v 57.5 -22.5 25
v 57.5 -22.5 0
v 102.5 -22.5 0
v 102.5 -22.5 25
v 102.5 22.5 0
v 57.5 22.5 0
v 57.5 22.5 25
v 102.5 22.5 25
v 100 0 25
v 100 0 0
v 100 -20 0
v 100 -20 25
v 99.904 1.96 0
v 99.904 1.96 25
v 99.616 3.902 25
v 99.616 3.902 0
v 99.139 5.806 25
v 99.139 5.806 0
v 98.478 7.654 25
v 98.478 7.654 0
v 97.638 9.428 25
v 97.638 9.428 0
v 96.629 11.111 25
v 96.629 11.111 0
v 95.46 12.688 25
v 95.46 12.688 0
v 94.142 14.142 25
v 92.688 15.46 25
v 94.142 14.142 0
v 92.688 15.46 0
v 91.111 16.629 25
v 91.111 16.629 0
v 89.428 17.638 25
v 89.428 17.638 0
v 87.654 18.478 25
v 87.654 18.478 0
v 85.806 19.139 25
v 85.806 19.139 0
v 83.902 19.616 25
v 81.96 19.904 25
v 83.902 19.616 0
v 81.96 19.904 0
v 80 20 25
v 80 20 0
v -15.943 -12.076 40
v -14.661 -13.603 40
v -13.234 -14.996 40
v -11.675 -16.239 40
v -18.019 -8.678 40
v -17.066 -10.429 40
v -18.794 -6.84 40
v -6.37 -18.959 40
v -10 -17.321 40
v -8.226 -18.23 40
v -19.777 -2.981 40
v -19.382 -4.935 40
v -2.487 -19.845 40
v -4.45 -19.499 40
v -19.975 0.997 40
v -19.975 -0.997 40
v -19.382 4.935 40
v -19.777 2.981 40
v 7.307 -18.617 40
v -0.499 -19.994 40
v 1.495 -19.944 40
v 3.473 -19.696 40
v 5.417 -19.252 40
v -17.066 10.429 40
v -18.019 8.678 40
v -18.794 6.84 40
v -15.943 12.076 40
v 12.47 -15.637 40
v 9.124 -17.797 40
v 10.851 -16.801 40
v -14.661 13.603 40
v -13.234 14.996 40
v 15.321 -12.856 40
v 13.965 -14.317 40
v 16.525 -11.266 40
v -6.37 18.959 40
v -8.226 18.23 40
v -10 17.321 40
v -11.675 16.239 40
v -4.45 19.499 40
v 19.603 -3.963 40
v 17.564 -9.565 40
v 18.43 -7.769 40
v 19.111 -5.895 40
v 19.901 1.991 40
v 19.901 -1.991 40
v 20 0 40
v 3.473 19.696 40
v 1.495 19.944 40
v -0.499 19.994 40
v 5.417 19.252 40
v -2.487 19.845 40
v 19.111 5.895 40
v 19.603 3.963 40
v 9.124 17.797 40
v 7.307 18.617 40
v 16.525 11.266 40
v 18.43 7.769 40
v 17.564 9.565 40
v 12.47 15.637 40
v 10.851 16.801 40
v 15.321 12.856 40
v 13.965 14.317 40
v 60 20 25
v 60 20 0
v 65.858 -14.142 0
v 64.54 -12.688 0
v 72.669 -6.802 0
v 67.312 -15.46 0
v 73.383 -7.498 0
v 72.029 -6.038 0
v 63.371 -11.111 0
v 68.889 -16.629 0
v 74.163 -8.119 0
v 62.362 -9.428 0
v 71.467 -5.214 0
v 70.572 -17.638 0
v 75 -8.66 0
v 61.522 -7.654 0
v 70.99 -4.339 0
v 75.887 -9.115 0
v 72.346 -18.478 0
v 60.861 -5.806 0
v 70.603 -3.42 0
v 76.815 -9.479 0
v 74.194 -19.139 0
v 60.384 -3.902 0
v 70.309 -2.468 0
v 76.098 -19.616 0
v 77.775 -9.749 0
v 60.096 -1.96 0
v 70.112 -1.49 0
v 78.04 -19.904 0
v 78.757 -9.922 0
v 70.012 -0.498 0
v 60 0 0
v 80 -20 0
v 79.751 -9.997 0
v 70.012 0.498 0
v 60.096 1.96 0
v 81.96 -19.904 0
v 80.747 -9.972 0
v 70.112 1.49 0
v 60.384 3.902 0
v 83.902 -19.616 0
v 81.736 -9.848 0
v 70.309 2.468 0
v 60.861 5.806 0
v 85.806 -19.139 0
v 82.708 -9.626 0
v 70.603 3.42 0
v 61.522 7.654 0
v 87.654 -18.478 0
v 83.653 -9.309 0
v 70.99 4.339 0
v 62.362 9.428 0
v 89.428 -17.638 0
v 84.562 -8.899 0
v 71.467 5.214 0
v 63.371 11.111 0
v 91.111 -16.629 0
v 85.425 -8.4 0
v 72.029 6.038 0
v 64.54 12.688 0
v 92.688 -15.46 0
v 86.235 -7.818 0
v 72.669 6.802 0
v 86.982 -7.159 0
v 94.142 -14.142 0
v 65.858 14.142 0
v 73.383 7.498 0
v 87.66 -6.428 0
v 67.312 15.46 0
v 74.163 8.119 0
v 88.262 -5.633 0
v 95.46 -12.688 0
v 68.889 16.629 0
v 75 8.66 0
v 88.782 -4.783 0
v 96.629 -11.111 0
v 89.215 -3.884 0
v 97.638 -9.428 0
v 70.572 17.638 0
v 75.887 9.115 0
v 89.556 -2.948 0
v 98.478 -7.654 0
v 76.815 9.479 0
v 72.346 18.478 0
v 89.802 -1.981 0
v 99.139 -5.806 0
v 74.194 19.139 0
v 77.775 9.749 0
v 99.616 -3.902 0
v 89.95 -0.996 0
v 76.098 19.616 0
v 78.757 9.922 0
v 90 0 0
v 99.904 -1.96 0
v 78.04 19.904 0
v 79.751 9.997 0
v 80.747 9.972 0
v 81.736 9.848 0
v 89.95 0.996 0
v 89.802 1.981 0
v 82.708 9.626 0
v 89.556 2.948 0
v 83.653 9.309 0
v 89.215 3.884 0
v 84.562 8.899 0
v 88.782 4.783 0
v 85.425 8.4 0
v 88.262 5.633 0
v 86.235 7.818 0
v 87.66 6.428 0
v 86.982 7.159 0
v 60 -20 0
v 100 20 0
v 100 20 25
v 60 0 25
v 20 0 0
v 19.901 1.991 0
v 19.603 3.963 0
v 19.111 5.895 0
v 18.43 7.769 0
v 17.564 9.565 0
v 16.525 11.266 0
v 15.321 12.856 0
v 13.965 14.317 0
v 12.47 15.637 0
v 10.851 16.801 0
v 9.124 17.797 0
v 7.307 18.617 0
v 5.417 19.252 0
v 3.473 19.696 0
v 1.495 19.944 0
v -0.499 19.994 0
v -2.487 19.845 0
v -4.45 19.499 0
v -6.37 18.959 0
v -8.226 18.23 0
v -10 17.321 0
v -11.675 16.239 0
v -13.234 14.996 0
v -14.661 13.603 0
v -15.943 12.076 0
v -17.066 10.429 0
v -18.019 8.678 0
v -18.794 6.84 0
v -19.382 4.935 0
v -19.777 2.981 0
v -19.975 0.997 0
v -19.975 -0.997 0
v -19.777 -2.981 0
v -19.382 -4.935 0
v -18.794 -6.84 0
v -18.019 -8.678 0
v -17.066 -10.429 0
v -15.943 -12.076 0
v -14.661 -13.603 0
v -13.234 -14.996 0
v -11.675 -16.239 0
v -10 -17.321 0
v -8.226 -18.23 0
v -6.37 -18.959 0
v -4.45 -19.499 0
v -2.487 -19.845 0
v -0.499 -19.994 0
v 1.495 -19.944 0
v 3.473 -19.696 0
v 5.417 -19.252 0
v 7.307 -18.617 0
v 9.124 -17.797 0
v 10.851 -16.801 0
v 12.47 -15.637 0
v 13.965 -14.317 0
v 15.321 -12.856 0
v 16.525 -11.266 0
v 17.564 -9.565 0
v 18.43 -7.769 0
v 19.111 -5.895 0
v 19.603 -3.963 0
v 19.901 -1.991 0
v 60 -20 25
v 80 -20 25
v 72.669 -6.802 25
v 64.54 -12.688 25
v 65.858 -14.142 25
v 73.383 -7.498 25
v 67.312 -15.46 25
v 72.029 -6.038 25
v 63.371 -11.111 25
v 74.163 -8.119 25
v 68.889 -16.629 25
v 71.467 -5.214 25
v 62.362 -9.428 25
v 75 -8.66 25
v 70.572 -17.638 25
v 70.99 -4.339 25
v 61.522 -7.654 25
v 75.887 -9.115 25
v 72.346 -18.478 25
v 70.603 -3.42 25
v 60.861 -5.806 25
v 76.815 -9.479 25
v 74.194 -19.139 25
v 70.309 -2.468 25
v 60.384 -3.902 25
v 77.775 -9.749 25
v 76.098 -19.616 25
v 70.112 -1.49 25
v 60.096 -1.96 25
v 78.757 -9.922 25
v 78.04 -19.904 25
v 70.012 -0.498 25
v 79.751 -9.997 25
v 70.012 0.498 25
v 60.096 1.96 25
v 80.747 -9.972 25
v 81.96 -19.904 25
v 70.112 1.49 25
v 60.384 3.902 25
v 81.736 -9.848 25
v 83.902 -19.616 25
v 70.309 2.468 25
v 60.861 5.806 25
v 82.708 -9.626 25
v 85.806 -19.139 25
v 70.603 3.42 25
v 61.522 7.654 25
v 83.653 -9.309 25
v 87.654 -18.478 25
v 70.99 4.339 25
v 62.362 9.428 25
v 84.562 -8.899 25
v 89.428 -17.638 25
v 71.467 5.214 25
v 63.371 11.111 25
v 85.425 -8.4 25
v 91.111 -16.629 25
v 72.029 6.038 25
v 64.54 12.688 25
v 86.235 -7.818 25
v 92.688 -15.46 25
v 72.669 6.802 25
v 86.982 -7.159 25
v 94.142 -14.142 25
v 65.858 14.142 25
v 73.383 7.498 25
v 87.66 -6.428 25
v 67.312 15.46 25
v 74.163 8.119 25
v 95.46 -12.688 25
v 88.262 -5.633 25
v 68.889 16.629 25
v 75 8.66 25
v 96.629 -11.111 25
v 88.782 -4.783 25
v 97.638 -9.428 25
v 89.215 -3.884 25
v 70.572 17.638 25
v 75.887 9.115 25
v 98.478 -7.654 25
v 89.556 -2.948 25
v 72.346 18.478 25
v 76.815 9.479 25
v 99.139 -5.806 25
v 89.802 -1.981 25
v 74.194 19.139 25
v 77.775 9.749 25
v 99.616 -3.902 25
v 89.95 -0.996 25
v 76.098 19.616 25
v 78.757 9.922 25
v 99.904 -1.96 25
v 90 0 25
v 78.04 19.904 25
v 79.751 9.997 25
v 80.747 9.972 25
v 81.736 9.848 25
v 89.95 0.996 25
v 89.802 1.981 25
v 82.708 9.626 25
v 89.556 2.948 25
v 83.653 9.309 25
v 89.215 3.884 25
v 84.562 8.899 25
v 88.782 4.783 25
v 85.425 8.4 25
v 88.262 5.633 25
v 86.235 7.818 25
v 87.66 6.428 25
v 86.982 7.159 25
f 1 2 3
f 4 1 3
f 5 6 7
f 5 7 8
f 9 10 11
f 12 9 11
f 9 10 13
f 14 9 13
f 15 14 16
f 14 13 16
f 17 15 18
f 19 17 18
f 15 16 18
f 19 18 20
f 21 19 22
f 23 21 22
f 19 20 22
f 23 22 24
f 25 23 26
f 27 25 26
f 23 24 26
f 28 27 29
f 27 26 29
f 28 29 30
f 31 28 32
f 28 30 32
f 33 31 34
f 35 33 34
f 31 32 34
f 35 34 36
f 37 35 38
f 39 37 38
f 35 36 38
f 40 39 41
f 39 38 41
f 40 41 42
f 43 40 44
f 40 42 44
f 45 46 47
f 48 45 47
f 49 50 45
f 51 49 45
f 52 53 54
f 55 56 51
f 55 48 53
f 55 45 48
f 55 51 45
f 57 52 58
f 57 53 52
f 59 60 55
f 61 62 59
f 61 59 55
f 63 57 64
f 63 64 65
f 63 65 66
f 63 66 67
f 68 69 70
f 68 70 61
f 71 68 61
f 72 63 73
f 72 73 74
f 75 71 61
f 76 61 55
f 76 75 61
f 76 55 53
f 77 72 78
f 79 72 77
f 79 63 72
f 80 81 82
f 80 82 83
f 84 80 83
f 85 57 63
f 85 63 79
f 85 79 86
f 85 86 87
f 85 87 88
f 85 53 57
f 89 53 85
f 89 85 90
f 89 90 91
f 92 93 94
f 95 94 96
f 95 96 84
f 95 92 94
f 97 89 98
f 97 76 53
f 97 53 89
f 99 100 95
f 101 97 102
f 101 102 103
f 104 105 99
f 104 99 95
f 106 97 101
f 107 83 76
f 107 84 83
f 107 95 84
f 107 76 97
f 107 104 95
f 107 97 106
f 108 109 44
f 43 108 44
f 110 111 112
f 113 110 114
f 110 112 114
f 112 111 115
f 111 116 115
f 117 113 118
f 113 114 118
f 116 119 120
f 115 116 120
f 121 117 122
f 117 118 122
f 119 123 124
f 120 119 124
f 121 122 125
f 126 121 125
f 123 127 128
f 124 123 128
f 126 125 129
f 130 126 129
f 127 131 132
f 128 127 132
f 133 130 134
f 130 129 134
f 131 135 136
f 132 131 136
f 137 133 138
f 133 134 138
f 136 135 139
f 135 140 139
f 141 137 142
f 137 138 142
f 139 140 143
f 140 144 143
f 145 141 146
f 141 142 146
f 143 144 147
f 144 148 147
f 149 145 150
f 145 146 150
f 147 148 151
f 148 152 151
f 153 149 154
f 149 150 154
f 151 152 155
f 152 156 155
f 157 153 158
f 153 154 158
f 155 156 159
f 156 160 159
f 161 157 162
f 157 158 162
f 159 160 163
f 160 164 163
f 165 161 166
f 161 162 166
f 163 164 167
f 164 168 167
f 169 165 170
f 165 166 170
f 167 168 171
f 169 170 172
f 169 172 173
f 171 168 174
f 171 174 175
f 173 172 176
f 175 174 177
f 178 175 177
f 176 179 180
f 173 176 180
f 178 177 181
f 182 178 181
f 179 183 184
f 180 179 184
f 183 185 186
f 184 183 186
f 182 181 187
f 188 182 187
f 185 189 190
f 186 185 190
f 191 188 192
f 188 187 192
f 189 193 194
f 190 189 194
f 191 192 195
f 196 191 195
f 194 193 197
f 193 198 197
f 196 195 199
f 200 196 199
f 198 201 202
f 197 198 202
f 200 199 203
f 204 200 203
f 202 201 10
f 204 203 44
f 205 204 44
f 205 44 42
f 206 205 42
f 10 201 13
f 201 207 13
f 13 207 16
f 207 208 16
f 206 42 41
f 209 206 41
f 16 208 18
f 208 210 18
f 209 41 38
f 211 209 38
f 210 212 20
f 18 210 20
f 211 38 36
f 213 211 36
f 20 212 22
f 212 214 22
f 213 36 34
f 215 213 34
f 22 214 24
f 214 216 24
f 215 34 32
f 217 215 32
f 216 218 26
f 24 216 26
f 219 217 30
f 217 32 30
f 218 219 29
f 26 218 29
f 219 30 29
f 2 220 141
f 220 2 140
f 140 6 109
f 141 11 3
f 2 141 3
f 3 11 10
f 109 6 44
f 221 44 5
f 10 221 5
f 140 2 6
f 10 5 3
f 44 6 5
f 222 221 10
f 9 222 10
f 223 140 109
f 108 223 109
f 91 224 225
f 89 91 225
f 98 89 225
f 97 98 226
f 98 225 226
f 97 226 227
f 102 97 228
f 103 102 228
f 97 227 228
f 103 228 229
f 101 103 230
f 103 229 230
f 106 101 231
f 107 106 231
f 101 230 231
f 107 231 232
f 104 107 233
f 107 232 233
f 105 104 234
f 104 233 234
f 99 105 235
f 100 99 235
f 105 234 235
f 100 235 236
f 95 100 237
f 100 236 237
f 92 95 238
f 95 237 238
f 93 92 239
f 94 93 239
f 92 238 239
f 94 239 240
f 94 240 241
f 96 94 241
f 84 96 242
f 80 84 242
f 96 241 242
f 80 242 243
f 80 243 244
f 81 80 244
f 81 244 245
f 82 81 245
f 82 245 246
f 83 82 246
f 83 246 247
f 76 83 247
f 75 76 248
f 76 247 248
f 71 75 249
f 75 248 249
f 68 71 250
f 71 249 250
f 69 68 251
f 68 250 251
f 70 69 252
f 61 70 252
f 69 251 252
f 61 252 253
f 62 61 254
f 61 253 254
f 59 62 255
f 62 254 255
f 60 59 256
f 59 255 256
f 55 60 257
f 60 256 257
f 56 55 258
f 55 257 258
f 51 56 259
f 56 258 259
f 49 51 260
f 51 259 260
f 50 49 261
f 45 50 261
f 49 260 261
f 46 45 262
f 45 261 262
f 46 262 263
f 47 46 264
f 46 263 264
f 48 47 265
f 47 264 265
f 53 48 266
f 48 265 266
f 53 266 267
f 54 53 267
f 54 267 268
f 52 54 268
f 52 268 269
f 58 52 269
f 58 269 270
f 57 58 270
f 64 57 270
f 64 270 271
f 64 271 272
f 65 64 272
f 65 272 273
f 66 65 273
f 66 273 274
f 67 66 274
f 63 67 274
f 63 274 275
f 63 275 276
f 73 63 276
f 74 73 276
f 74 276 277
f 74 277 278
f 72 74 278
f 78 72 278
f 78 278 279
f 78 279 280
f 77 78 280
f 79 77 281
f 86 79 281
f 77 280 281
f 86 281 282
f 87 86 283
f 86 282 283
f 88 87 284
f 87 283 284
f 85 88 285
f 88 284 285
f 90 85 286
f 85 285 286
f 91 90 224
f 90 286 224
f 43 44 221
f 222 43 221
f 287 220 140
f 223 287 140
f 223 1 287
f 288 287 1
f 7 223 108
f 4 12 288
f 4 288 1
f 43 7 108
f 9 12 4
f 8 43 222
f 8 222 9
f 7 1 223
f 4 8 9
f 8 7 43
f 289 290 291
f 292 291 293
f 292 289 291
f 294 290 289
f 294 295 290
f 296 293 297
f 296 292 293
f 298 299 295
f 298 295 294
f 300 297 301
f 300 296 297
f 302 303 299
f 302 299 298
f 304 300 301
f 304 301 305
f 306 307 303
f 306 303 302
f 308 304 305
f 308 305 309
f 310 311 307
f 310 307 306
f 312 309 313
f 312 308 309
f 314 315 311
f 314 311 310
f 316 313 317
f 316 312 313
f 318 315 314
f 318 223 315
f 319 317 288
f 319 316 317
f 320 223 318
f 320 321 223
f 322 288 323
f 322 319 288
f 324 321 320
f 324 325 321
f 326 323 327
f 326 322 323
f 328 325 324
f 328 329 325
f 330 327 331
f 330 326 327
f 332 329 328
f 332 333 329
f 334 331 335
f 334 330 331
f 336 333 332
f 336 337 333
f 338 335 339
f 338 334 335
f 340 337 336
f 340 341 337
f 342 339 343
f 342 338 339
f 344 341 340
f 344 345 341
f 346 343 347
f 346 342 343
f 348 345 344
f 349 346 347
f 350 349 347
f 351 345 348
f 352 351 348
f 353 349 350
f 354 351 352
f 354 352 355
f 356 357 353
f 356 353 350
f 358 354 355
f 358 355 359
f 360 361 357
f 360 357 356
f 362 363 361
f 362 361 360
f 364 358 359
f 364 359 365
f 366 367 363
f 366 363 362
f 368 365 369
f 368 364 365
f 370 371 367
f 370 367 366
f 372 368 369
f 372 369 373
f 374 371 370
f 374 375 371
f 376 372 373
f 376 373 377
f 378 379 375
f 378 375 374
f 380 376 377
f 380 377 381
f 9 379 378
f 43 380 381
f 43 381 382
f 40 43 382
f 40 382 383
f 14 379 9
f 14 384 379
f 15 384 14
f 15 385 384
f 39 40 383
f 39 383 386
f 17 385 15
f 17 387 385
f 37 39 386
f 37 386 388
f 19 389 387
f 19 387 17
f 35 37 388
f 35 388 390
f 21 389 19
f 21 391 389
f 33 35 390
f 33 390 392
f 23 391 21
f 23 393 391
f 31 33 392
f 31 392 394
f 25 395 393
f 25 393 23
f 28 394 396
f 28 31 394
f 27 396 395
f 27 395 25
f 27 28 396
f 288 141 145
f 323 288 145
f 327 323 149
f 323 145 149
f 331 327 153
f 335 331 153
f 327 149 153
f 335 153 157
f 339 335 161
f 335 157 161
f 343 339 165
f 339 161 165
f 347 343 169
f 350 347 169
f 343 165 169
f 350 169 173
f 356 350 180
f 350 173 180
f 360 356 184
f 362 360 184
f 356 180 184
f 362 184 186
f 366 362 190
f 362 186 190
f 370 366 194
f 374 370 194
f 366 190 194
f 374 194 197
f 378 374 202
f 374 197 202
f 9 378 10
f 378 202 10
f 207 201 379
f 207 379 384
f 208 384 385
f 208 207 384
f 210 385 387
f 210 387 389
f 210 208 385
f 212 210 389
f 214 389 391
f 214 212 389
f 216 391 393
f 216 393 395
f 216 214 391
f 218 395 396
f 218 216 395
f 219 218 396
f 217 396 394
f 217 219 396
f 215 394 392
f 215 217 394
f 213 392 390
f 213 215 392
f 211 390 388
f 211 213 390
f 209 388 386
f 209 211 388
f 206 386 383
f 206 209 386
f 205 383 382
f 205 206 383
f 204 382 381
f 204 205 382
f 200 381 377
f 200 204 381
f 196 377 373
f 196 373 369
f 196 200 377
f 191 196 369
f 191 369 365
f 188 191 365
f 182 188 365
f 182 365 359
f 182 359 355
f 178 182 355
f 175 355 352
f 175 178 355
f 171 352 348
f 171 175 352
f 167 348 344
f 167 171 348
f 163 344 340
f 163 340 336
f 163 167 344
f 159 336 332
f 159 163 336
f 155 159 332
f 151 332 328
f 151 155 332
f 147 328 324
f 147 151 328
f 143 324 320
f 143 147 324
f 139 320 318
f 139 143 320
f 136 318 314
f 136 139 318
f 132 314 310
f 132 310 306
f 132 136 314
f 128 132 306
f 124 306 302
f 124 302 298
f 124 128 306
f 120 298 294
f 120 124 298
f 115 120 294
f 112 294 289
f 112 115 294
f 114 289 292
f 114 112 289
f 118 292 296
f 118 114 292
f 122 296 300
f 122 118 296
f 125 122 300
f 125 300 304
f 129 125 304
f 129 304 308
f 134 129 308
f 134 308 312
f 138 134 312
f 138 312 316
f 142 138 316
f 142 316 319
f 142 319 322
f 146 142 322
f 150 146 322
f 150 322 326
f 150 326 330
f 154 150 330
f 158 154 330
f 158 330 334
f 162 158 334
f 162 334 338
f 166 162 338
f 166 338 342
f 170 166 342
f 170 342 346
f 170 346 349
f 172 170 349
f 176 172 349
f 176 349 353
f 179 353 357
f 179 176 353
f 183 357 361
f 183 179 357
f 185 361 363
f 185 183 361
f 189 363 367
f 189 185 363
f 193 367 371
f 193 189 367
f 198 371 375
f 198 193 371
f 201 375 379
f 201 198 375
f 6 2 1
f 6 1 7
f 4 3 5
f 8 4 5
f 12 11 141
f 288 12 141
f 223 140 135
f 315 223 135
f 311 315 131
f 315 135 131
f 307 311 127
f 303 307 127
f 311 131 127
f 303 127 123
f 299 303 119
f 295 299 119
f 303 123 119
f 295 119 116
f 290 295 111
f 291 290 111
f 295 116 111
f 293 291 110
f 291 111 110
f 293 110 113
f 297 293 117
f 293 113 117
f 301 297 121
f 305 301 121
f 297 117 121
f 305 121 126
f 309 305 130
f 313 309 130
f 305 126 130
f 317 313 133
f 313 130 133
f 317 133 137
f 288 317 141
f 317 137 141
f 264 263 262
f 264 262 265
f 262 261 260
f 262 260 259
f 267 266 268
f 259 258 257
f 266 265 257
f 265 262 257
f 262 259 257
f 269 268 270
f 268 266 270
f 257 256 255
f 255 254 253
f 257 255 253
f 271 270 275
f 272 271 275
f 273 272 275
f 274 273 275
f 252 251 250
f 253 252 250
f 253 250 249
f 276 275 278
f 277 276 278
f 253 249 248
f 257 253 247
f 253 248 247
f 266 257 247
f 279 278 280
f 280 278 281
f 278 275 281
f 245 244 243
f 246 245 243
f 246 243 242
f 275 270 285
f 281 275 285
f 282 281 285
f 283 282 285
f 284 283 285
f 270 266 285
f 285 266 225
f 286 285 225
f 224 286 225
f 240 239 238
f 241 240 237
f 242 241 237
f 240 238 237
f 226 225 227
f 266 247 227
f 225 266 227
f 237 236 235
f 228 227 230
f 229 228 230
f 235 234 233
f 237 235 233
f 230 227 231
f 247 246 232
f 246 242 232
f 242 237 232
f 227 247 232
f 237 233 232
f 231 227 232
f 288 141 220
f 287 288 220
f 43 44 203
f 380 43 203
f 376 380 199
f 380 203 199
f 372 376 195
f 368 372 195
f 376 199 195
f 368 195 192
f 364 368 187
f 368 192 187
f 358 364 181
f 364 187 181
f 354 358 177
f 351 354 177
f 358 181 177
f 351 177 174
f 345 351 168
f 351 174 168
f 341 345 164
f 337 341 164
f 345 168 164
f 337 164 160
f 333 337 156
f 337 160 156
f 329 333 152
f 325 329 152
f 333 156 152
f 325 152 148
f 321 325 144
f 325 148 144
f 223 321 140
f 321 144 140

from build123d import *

# Parameters (mm, degrees)
F0_R     = 20
F1_DEPTH = 40
F0_W     = 45
F0_H     = 45
F0_R_2   = 10
F2_DEPTH = 25


with BuildPart() as f1:
    # F0 (on Top) → F1 (new body)
    with BuildSketch(Plane.XY):
        Circle(F0_R)
    extrude(amount=F1_DEPTH)


with BuildPart() as f2:
    # F0 (on Top) → F2 (new body)
    with BuildSketch(Plane.XY):
        with Locations((80, 0)):
            Rectangle(F0_W, F0_H)
        Polygon((100, 20), (100, 0), (100, -20), (80, -20), (60, -20), (60, 0), (60, 20), (80, 20), align=None, mode=Mode.SUBTRACT)
        with BuildLine():
            ThreePointArc((80, -20), (94.142136, -14.142136), (100, 0))
            ThreePointArc((100, 0), (94.142136, 14.142136), (80, 20))
            ThreePointArc((80, 20), (65.857864, 14.142136), (60, 0))
            ThreePointArc((60, 0), (65.857864, -14.142136), (80, -20))
        make_face()
        with Locations((80, 0)):
            Circle(F0_R_2, mode=Mode.SUBTRACT)
    extrude(amount=F2_DEPTH)


solid = Compound([f1.part, f2.part])
